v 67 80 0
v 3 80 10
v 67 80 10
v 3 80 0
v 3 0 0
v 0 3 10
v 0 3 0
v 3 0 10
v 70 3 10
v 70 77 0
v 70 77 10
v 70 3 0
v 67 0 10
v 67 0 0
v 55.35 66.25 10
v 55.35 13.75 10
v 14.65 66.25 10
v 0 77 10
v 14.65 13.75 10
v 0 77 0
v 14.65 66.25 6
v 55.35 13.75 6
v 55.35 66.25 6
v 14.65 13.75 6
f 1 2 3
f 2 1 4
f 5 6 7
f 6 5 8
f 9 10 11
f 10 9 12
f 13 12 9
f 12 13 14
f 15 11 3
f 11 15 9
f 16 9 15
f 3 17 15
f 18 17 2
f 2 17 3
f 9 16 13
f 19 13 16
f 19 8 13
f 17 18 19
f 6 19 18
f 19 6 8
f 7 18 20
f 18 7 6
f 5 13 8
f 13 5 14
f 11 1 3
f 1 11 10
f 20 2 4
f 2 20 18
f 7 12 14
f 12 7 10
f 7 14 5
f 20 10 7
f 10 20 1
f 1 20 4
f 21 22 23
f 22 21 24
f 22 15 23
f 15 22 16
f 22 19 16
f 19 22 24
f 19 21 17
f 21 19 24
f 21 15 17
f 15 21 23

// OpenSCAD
$fn = 32;

// ----------------------------------------------------------------------
// Windowed plate: 1 voids, 70 x 80 x 10 mm
// ----------------------------------------------------------------------

// --- parameters (mm) ---
plate_l = 70;             // plate length, X
plate_w = 80;             // plate width, Y
plate_t = 10;             // plate thickness, Z
edge_margin = 10;         // wall from the plate edge to any window
win1_l = 40.7;            // window length
win1_w = 52.5;            // window width
depth_1 = 4;              // depth of void 1 (full thickness = through)
corner_c = 3;             // corner chamfer of the plate
fit_tol = 0.05;           // declared fit tolerance (prompt contract)
free_tol = 0.3;           // declared free tolerance (prompt contract)

profile = [[3, 0], [67, 0], [70, 3], [70, 77], [67, 80], [3, 80], [0, 77], [0, 3]];  // primary outline, 8 points, counter clockwise
void_1 = [[14.65, 13.75], [55.35, 13.75], [55.35, 66.25], [14.65, 66.25]];  // large central window, 4 points

// --- the one profile operation ---
difference() {
  linear_extrude(height = plate_t) polygon(points = profile);
  translate([0, 0, plate_t - depth_1])
    linear_extrude(height = depth_1 + 1) polygon(points = void_1);
}
